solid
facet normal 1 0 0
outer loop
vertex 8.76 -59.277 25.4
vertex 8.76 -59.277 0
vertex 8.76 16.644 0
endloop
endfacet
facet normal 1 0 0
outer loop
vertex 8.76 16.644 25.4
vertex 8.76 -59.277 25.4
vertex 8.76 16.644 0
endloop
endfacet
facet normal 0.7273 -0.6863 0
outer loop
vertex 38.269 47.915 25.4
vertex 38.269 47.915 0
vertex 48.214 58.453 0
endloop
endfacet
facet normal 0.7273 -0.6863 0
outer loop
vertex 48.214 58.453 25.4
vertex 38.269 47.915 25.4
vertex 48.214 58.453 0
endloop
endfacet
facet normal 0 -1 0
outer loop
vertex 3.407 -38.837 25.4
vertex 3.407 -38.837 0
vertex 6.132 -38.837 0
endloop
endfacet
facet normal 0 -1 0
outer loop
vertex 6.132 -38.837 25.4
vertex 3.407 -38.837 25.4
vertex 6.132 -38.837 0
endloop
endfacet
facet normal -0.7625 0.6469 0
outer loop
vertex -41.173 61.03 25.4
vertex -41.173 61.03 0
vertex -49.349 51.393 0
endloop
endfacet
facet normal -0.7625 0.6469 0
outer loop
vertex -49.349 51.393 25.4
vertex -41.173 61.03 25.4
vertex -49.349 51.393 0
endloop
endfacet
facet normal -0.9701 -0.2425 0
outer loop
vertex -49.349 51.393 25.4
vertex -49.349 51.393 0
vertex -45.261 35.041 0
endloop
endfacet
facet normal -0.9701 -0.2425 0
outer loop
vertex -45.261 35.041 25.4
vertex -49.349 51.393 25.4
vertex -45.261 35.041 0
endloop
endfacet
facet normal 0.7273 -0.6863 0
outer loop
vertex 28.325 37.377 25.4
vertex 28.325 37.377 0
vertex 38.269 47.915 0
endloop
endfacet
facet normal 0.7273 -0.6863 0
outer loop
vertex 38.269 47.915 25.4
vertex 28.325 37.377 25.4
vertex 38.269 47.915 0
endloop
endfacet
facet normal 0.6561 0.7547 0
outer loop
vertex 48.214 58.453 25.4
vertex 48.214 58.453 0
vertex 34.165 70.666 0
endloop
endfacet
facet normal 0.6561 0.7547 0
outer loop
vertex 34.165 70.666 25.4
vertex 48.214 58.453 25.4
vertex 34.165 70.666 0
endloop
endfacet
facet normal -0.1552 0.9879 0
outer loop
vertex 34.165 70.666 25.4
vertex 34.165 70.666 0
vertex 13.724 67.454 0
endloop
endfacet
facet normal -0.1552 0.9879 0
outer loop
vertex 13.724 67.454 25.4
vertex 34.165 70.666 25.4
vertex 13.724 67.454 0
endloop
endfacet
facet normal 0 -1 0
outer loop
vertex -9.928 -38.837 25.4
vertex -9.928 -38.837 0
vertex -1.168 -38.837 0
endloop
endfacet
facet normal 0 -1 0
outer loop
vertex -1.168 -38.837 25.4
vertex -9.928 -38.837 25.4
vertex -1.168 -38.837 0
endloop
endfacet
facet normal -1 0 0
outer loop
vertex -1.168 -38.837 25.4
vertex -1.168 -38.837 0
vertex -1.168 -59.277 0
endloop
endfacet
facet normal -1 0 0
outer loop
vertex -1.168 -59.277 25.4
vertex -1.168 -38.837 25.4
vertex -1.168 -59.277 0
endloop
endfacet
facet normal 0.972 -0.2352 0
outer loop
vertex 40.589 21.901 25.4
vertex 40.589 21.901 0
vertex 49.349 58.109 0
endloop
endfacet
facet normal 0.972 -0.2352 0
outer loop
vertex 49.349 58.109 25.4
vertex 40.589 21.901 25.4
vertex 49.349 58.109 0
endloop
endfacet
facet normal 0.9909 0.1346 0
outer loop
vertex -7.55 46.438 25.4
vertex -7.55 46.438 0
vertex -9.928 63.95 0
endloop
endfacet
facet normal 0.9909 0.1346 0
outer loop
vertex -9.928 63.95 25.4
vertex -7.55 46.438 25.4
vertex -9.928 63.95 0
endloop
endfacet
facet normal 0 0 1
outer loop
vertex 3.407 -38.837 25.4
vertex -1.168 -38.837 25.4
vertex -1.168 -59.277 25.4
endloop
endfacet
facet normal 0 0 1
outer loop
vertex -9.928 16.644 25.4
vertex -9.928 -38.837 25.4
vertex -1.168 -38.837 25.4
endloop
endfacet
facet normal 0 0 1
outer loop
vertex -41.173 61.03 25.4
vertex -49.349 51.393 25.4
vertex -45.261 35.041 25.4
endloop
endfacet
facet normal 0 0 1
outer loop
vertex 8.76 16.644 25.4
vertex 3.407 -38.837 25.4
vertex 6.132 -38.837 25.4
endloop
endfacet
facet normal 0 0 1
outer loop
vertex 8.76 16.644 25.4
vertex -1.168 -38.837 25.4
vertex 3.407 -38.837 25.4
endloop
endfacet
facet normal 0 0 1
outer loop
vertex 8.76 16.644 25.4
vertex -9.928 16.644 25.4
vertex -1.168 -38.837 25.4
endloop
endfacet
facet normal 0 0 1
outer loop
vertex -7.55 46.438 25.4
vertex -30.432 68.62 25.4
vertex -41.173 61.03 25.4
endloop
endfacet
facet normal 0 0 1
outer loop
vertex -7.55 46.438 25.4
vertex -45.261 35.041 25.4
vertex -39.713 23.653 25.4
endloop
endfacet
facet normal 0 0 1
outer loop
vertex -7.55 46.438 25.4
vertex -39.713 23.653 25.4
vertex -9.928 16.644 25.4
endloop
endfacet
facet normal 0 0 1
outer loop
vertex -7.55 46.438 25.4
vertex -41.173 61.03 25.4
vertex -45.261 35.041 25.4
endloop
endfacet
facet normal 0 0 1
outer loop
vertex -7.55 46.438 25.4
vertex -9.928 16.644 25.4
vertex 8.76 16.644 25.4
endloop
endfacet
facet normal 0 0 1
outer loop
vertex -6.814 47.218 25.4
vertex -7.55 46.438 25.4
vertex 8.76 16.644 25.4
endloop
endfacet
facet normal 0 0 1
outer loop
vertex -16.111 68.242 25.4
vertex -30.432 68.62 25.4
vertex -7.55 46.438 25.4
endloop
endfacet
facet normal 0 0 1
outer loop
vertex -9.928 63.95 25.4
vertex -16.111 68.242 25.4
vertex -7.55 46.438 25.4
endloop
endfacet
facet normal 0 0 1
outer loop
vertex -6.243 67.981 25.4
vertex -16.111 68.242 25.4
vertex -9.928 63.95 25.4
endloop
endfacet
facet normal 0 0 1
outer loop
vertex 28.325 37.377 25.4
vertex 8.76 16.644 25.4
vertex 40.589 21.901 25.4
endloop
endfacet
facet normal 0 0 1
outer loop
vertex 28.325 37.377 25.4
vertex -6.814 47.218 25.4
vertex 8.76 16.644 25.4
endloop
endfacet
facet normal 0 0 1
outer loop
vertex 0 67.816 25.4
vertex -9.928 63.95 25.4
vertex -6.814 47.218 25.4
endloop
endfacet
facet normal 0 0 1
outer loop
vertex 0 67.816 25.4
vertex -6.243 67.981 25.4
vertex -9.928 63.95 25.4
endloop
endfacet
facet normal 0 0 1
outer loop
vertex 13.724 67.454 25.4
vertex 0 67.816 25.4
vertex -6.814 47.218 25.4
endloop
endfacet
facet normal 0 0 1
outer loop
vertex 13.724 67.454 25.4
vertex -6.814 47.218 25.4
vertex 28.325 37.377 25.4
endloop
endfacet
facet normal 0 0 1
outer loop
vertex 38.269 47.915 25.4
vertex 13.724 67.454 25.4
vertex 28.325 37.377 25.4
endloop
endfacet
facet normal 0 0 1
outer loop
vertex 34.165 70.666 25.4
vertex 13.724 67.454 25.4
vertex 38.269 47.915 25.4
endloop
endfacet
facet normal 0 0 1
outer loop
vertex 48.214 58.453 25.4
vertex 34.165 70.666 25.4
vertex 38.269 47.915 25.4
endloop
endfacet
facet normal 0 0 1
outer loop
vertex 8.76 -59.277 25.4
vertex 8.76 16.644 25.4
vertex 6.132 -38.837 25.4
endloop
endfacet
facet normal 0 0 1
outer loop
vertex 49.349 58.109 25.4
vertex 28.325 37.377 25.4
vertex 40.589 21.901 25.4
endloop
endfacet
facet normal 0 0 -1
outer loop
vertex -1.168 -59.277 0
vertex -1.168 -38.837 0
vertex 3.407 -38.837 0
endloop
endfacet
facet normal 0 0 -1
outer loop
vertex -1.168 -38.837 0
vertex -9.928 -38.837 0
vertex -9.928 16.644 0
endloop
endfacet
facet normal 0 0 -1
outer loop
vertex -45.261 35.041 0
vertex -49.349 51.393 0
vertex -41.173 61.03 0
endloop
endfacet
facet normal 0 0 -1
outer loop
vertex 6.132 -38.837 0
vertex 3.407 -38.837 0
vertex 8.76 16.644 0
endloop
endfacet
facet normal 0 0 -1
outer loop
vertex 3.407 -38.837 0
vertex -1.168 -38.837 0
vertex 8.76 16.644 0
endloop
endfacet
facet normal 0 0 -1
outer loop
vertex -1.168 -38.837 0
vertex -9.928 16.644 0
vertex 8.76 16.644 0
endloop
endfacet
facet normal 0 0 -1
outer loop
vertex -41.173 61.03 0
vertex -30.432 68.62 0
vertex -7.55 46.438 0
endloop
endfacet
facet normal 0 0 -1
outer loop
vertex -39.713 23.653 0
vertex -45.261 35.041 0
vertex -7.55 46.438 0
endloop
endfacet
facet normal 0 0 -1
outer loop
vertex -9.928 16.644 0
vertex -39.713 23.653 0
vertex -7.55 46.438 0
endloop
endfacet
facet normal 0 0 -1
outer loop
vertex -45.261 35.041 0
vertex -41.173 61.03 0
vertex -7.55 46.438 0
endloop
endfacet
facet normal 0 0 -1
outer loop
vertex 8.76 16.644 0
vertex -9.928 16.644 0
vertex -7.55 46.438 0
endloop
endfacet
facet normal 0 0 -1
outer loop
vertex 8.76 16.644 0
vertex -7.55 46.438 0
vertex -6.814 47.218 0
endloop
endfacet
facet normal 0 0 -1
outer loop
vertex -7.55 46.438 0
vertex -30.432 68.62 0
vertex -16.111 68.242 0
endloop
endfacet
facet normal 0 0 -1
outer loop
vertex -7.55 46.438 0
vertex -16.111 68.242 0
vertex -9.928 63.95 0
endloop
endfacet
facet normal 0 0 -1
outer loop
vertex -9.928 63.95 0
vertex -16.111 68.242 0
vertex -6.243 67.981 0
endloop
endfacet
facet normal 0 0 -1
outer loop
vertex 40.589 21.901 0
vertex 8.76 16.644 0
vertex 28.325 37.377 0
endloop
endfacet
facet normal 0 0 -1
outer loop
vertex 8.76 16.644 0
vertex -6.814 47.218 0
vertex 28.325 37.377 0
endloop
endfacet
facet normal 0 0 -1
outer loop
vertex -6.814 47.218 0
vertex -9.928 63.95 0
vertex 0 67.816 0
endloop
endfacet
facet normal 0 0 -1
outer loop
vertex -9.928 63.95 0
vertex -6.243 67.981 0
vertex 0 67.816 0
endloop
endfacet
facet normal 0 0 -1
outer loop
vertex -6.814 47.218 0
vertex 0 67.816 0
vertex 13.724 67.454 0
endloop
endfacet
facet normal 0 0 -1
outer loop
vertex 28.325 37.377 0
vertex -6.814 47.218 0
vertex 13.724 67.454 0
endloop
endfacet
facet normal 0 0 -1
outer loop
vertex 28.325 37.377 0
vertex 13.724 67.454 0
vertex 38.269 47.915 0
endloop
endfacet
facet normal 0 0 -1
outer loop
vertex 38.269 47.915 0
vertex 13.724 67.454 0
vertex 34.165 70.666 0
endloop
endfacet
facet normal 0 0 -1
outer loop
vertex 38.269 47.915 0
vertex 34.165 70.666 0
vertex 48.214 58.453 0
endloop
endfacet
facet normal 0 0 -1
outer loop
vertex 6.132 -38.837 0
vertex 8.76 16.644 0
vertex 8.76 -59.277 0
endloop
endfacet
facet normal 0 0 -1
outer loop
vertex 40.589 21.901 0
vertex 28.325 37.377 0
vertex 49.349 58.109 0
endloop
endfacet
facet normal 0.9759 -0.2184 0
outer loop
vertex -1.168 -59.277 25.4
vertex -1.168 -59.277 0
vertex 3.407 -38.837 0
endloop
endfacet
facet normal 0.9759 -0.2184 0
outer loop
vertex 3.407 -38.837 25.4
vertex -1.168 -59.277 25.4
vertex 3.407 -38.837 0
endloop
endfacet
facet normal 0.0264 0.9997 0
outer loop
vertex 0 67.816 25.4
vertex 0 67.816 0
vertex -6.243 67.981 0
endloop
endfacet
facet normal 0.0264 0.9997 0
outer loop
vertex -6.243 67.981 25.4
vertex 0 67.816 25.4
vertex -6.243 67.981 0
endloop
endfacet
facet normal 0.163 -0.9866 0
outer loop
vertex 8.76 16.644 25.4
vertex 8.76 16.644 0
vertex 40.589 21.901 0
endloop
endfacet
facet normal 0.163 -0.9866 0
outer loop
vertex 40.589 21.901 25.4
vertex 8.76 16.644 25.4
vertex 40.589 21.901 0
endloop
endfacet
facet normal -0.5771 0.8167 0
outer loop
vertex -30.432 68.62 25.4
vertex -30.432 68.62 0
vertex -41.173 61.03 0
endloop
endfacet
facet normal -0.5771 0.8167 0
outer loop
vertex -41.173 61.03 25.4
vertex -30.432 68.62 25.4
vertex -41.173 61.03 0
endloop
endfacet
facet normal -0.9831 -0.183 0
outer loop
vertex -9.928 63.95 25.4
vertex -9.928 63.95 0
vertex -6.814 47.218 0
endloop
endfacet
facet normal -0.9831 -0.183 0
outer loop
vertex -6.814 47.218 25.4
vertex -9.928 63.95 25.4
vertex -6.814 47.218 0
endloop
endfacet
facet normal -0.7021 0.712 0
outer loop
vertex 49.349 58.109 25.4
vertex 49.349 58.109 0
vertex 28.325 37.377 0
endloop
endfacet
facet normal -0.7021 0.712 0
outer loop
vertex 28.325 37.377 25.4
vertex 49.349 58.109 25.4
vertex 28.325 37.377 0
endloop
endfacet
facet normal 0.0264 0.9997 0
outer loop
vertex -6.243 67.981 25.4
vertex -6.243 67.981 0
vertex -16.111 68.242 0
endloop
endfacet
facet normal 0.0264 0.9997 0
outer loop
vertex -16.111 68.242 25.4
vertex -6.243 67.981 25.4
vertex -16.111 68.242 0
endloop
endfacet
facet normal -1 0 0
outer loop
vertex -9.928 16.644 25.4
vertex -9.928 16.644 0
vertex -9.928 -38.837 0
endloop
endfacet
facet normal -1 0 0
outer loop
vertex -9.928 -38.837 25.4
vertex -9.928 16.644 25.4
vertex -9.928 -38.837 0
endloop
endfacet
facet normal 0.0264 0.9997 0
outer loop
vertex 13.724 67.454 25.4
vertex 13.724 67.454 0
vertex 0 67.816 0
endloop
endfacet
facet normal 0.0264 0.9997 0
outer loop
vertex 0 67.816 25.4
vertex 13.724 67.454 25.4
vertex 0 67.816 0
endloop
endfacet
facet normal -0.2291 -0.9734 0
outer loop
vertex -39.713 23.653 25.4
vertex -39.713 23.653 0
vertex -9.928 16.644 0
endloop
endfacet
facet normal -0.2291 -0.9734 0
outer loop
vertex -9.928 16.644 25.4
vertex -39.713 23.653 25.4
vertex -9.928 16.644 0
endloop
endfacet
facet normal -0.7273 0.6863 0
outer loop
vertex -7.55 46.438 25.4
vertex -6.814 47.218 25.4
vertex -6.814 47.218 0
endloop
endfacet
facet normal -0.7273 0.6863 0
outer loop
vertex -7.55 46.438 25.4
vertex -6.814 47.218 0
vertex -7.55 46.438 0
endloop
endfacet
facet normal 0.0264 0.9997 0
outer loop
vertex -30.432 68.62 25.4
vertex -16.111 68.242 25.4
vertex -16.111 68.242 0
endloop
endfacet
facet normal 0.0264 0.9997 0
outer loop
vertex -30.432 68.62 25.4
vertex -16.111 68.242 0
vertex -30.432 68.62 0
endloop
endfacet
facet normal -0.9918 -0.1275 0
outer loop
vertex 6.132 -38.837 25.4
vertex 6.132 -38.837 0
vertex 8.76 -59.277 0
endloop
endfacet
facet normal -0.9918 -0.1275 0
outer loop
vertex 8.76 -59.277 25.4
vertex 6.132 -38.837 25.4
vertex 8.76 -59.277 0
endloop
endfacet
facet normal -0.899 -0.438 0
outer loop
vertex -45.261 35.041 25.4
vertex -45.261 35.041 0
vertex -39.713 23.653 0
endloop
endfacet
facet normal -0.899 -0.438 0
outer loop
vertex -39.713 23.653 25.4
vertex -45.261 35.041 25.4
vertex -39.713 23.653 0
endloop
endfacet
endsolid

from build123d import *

# Parameters (mm, degrees)
F1_DEPTH = 25.4


with BuildPart() as f1:
    # F0 (on Top) → F1 (new body)
    with BuildSketch(Plane.XY):
        Polygon((-9.9282488227, 16.6444163769), (-9.9282488227, -38.8369709253), (-6.8141991987, -38.8369709253), (-4.3801111169, -38.8369709253), (-1.1680317111, -38.8369709253), (3.4067514008, -38.8369709253), (6.1321551912, -38.8369709253), (8.7602203712, -38.8369709253), (8.7602203712, 16.6444163769), (0, 16.6444163769), (-3.5040895455, 16.6444163769), (-6.8141991987, 16.6444163769), align=None)
        Polygon((-20.4405128956, 23.6525926739), (-9.9282488227, 16.6444163769), (-6.8141991987, 16.6444163769), (-12.2392783805, 23.6525926739), (-12.264306657, 23.6525926739), align=None)
        Polygon((-39.7129952908, 23.6525926739), (-9.9282488227, 16.6444163769), (-20.4405128956, 23.6525926739), align=None)
        Polygon((-12.2392783805, 23.6525926739), (-6.8141991987, 16.6444163769), (-3.5040895455, 16.6444163769), (-6.6358093424, 39.7052673339), (0, 27.0106745884), (0, 40.0465349111), (0, 51.3932853937), (-6.2433463768, 67.9810519437), (-16.1107429013, 68.2416611761), (-23.2746789764, 63.9495998621), (-15.1843791828, 53.4984625885), (-21.9592093912, 36.2089052796), (-18.098320559, 31.2213670903), align=None)
        Polygon((-6.8141991987, 47.2179802464), (-7.5501442092, 46.4380983203), (-9.9282488227, 63.9495998621), align=None, mode=Mode.SUBTRACT)
        Polygon((-30.4814127266, 30.3465261318), (-20.4405128956, 23.6525926739), (-12.264306657, 23.6525926739), (-12.2392783805, 23.6525926739), (-18.098320559, 31.2213670903), (-30.4814127266, 32.9626211831), align=None)
        Polygon((-39.7129952908, 23.6525926739), (-20.4405128956, 23.6525926739), (-30.4814127266, 30.3465261318), (-30.4814127266, 32.9626211831), (-45.2611297369, 35.0408777595), align=None)
        Polygon((3.4067514008, -38.8369709253), (-1.1680317111, -38.8369709253), (-1.1680317111, -59.2774823308), align=None)
        Polygon((-6.6358093424, 39.7052673339), (-3.5040895455, 16.6444163769), (0, 16.6444163769), (0, 21.9005476683), (0, 27.0106745884), align=None)
        Polygon((-49.3492335081, 51.3932853937), (-45.2611297369, 35.0408777595), (-30.4814127266, 32.9626211831), (-18.098320559, 31.2213670903), (-21.9592093912, 36.2089052796), (-30.4814127266, 47.2179802464), align=None)
        Polygon((0, 21.9005476683), (0, 16.6444163769), (8.7602203712, 16.6444163769), (15.9789933035, 43.8407290326), (18.5424652882, 53.4984625885), (21.3165320456, 63.9495998621), (34.1648571193, 70.665769279), (13.7243429199, 67.4536824226), (0, 56.9414235651), (0, 51.3932853937), (0, 40.0465349111), (0, 27.0106745884), align=None)
        Polygon((-41.173029691, 61.0295273364), (-49.3492335081, 51.3932853937), (-30.4814127266, 47.2179802464), (-33.7135461765, 51.3932853937), align=None)
        Polygon((8.7602203712, -38.8369709253), (6.1321551912, -38.8369709253), (8.7602203712, -59.2774823308), align=None)
        Polygon((15.9789933035, 43.8407290326), (8.7602203712, 16.6444163769), (18.5424652882, 27.0106745884), (28.3247102052, 37.3769327998), (38.2691381014, 47.9150565343), (48.2135659976, 58.4531802689), (34.1648571193, 70.665769279), (21.3165320456, 63.9495998621), (18.5424652882, 53.4984625885), align=None)
        Polygon((18.5424652882, 27.0106745884), (8.7602203712, 16.6444163769), (40.5890159309, 21.9005476683), (49.3492297828, 58.1094510853), (28.3247102052, 37.3769327998), align=None)
        Polygon((-30.4814127266, 47.2179802464), (-21.9592093912, 36.2089052796), (-15.1843791828, 53.4984625885), (-23.2746789764, 63.9495998621), (-16.1107429013, 68.2416611761), (-30.4322889094, 68.6199095927), (-33.7135461765, 51.3932853937), align=None)
        Polygon((-30.4322889094, 68.6199095927), (-41.173029691, 61.0295273364), (-33.7135461765, 51.3932853937), align=None)
        Polygon((-6.2433463768, 67.9810519437), (0, 51.3932853937), (0, 56.9414235651), (0, 67.8161580224), align=None)
        Polygon((0, 67.8161580224), (0, 56.9414235651), (13.7243429199, 67.4536824226), align=None)
    extrude(amount=F1_DEPTH)


solid = f1.part
